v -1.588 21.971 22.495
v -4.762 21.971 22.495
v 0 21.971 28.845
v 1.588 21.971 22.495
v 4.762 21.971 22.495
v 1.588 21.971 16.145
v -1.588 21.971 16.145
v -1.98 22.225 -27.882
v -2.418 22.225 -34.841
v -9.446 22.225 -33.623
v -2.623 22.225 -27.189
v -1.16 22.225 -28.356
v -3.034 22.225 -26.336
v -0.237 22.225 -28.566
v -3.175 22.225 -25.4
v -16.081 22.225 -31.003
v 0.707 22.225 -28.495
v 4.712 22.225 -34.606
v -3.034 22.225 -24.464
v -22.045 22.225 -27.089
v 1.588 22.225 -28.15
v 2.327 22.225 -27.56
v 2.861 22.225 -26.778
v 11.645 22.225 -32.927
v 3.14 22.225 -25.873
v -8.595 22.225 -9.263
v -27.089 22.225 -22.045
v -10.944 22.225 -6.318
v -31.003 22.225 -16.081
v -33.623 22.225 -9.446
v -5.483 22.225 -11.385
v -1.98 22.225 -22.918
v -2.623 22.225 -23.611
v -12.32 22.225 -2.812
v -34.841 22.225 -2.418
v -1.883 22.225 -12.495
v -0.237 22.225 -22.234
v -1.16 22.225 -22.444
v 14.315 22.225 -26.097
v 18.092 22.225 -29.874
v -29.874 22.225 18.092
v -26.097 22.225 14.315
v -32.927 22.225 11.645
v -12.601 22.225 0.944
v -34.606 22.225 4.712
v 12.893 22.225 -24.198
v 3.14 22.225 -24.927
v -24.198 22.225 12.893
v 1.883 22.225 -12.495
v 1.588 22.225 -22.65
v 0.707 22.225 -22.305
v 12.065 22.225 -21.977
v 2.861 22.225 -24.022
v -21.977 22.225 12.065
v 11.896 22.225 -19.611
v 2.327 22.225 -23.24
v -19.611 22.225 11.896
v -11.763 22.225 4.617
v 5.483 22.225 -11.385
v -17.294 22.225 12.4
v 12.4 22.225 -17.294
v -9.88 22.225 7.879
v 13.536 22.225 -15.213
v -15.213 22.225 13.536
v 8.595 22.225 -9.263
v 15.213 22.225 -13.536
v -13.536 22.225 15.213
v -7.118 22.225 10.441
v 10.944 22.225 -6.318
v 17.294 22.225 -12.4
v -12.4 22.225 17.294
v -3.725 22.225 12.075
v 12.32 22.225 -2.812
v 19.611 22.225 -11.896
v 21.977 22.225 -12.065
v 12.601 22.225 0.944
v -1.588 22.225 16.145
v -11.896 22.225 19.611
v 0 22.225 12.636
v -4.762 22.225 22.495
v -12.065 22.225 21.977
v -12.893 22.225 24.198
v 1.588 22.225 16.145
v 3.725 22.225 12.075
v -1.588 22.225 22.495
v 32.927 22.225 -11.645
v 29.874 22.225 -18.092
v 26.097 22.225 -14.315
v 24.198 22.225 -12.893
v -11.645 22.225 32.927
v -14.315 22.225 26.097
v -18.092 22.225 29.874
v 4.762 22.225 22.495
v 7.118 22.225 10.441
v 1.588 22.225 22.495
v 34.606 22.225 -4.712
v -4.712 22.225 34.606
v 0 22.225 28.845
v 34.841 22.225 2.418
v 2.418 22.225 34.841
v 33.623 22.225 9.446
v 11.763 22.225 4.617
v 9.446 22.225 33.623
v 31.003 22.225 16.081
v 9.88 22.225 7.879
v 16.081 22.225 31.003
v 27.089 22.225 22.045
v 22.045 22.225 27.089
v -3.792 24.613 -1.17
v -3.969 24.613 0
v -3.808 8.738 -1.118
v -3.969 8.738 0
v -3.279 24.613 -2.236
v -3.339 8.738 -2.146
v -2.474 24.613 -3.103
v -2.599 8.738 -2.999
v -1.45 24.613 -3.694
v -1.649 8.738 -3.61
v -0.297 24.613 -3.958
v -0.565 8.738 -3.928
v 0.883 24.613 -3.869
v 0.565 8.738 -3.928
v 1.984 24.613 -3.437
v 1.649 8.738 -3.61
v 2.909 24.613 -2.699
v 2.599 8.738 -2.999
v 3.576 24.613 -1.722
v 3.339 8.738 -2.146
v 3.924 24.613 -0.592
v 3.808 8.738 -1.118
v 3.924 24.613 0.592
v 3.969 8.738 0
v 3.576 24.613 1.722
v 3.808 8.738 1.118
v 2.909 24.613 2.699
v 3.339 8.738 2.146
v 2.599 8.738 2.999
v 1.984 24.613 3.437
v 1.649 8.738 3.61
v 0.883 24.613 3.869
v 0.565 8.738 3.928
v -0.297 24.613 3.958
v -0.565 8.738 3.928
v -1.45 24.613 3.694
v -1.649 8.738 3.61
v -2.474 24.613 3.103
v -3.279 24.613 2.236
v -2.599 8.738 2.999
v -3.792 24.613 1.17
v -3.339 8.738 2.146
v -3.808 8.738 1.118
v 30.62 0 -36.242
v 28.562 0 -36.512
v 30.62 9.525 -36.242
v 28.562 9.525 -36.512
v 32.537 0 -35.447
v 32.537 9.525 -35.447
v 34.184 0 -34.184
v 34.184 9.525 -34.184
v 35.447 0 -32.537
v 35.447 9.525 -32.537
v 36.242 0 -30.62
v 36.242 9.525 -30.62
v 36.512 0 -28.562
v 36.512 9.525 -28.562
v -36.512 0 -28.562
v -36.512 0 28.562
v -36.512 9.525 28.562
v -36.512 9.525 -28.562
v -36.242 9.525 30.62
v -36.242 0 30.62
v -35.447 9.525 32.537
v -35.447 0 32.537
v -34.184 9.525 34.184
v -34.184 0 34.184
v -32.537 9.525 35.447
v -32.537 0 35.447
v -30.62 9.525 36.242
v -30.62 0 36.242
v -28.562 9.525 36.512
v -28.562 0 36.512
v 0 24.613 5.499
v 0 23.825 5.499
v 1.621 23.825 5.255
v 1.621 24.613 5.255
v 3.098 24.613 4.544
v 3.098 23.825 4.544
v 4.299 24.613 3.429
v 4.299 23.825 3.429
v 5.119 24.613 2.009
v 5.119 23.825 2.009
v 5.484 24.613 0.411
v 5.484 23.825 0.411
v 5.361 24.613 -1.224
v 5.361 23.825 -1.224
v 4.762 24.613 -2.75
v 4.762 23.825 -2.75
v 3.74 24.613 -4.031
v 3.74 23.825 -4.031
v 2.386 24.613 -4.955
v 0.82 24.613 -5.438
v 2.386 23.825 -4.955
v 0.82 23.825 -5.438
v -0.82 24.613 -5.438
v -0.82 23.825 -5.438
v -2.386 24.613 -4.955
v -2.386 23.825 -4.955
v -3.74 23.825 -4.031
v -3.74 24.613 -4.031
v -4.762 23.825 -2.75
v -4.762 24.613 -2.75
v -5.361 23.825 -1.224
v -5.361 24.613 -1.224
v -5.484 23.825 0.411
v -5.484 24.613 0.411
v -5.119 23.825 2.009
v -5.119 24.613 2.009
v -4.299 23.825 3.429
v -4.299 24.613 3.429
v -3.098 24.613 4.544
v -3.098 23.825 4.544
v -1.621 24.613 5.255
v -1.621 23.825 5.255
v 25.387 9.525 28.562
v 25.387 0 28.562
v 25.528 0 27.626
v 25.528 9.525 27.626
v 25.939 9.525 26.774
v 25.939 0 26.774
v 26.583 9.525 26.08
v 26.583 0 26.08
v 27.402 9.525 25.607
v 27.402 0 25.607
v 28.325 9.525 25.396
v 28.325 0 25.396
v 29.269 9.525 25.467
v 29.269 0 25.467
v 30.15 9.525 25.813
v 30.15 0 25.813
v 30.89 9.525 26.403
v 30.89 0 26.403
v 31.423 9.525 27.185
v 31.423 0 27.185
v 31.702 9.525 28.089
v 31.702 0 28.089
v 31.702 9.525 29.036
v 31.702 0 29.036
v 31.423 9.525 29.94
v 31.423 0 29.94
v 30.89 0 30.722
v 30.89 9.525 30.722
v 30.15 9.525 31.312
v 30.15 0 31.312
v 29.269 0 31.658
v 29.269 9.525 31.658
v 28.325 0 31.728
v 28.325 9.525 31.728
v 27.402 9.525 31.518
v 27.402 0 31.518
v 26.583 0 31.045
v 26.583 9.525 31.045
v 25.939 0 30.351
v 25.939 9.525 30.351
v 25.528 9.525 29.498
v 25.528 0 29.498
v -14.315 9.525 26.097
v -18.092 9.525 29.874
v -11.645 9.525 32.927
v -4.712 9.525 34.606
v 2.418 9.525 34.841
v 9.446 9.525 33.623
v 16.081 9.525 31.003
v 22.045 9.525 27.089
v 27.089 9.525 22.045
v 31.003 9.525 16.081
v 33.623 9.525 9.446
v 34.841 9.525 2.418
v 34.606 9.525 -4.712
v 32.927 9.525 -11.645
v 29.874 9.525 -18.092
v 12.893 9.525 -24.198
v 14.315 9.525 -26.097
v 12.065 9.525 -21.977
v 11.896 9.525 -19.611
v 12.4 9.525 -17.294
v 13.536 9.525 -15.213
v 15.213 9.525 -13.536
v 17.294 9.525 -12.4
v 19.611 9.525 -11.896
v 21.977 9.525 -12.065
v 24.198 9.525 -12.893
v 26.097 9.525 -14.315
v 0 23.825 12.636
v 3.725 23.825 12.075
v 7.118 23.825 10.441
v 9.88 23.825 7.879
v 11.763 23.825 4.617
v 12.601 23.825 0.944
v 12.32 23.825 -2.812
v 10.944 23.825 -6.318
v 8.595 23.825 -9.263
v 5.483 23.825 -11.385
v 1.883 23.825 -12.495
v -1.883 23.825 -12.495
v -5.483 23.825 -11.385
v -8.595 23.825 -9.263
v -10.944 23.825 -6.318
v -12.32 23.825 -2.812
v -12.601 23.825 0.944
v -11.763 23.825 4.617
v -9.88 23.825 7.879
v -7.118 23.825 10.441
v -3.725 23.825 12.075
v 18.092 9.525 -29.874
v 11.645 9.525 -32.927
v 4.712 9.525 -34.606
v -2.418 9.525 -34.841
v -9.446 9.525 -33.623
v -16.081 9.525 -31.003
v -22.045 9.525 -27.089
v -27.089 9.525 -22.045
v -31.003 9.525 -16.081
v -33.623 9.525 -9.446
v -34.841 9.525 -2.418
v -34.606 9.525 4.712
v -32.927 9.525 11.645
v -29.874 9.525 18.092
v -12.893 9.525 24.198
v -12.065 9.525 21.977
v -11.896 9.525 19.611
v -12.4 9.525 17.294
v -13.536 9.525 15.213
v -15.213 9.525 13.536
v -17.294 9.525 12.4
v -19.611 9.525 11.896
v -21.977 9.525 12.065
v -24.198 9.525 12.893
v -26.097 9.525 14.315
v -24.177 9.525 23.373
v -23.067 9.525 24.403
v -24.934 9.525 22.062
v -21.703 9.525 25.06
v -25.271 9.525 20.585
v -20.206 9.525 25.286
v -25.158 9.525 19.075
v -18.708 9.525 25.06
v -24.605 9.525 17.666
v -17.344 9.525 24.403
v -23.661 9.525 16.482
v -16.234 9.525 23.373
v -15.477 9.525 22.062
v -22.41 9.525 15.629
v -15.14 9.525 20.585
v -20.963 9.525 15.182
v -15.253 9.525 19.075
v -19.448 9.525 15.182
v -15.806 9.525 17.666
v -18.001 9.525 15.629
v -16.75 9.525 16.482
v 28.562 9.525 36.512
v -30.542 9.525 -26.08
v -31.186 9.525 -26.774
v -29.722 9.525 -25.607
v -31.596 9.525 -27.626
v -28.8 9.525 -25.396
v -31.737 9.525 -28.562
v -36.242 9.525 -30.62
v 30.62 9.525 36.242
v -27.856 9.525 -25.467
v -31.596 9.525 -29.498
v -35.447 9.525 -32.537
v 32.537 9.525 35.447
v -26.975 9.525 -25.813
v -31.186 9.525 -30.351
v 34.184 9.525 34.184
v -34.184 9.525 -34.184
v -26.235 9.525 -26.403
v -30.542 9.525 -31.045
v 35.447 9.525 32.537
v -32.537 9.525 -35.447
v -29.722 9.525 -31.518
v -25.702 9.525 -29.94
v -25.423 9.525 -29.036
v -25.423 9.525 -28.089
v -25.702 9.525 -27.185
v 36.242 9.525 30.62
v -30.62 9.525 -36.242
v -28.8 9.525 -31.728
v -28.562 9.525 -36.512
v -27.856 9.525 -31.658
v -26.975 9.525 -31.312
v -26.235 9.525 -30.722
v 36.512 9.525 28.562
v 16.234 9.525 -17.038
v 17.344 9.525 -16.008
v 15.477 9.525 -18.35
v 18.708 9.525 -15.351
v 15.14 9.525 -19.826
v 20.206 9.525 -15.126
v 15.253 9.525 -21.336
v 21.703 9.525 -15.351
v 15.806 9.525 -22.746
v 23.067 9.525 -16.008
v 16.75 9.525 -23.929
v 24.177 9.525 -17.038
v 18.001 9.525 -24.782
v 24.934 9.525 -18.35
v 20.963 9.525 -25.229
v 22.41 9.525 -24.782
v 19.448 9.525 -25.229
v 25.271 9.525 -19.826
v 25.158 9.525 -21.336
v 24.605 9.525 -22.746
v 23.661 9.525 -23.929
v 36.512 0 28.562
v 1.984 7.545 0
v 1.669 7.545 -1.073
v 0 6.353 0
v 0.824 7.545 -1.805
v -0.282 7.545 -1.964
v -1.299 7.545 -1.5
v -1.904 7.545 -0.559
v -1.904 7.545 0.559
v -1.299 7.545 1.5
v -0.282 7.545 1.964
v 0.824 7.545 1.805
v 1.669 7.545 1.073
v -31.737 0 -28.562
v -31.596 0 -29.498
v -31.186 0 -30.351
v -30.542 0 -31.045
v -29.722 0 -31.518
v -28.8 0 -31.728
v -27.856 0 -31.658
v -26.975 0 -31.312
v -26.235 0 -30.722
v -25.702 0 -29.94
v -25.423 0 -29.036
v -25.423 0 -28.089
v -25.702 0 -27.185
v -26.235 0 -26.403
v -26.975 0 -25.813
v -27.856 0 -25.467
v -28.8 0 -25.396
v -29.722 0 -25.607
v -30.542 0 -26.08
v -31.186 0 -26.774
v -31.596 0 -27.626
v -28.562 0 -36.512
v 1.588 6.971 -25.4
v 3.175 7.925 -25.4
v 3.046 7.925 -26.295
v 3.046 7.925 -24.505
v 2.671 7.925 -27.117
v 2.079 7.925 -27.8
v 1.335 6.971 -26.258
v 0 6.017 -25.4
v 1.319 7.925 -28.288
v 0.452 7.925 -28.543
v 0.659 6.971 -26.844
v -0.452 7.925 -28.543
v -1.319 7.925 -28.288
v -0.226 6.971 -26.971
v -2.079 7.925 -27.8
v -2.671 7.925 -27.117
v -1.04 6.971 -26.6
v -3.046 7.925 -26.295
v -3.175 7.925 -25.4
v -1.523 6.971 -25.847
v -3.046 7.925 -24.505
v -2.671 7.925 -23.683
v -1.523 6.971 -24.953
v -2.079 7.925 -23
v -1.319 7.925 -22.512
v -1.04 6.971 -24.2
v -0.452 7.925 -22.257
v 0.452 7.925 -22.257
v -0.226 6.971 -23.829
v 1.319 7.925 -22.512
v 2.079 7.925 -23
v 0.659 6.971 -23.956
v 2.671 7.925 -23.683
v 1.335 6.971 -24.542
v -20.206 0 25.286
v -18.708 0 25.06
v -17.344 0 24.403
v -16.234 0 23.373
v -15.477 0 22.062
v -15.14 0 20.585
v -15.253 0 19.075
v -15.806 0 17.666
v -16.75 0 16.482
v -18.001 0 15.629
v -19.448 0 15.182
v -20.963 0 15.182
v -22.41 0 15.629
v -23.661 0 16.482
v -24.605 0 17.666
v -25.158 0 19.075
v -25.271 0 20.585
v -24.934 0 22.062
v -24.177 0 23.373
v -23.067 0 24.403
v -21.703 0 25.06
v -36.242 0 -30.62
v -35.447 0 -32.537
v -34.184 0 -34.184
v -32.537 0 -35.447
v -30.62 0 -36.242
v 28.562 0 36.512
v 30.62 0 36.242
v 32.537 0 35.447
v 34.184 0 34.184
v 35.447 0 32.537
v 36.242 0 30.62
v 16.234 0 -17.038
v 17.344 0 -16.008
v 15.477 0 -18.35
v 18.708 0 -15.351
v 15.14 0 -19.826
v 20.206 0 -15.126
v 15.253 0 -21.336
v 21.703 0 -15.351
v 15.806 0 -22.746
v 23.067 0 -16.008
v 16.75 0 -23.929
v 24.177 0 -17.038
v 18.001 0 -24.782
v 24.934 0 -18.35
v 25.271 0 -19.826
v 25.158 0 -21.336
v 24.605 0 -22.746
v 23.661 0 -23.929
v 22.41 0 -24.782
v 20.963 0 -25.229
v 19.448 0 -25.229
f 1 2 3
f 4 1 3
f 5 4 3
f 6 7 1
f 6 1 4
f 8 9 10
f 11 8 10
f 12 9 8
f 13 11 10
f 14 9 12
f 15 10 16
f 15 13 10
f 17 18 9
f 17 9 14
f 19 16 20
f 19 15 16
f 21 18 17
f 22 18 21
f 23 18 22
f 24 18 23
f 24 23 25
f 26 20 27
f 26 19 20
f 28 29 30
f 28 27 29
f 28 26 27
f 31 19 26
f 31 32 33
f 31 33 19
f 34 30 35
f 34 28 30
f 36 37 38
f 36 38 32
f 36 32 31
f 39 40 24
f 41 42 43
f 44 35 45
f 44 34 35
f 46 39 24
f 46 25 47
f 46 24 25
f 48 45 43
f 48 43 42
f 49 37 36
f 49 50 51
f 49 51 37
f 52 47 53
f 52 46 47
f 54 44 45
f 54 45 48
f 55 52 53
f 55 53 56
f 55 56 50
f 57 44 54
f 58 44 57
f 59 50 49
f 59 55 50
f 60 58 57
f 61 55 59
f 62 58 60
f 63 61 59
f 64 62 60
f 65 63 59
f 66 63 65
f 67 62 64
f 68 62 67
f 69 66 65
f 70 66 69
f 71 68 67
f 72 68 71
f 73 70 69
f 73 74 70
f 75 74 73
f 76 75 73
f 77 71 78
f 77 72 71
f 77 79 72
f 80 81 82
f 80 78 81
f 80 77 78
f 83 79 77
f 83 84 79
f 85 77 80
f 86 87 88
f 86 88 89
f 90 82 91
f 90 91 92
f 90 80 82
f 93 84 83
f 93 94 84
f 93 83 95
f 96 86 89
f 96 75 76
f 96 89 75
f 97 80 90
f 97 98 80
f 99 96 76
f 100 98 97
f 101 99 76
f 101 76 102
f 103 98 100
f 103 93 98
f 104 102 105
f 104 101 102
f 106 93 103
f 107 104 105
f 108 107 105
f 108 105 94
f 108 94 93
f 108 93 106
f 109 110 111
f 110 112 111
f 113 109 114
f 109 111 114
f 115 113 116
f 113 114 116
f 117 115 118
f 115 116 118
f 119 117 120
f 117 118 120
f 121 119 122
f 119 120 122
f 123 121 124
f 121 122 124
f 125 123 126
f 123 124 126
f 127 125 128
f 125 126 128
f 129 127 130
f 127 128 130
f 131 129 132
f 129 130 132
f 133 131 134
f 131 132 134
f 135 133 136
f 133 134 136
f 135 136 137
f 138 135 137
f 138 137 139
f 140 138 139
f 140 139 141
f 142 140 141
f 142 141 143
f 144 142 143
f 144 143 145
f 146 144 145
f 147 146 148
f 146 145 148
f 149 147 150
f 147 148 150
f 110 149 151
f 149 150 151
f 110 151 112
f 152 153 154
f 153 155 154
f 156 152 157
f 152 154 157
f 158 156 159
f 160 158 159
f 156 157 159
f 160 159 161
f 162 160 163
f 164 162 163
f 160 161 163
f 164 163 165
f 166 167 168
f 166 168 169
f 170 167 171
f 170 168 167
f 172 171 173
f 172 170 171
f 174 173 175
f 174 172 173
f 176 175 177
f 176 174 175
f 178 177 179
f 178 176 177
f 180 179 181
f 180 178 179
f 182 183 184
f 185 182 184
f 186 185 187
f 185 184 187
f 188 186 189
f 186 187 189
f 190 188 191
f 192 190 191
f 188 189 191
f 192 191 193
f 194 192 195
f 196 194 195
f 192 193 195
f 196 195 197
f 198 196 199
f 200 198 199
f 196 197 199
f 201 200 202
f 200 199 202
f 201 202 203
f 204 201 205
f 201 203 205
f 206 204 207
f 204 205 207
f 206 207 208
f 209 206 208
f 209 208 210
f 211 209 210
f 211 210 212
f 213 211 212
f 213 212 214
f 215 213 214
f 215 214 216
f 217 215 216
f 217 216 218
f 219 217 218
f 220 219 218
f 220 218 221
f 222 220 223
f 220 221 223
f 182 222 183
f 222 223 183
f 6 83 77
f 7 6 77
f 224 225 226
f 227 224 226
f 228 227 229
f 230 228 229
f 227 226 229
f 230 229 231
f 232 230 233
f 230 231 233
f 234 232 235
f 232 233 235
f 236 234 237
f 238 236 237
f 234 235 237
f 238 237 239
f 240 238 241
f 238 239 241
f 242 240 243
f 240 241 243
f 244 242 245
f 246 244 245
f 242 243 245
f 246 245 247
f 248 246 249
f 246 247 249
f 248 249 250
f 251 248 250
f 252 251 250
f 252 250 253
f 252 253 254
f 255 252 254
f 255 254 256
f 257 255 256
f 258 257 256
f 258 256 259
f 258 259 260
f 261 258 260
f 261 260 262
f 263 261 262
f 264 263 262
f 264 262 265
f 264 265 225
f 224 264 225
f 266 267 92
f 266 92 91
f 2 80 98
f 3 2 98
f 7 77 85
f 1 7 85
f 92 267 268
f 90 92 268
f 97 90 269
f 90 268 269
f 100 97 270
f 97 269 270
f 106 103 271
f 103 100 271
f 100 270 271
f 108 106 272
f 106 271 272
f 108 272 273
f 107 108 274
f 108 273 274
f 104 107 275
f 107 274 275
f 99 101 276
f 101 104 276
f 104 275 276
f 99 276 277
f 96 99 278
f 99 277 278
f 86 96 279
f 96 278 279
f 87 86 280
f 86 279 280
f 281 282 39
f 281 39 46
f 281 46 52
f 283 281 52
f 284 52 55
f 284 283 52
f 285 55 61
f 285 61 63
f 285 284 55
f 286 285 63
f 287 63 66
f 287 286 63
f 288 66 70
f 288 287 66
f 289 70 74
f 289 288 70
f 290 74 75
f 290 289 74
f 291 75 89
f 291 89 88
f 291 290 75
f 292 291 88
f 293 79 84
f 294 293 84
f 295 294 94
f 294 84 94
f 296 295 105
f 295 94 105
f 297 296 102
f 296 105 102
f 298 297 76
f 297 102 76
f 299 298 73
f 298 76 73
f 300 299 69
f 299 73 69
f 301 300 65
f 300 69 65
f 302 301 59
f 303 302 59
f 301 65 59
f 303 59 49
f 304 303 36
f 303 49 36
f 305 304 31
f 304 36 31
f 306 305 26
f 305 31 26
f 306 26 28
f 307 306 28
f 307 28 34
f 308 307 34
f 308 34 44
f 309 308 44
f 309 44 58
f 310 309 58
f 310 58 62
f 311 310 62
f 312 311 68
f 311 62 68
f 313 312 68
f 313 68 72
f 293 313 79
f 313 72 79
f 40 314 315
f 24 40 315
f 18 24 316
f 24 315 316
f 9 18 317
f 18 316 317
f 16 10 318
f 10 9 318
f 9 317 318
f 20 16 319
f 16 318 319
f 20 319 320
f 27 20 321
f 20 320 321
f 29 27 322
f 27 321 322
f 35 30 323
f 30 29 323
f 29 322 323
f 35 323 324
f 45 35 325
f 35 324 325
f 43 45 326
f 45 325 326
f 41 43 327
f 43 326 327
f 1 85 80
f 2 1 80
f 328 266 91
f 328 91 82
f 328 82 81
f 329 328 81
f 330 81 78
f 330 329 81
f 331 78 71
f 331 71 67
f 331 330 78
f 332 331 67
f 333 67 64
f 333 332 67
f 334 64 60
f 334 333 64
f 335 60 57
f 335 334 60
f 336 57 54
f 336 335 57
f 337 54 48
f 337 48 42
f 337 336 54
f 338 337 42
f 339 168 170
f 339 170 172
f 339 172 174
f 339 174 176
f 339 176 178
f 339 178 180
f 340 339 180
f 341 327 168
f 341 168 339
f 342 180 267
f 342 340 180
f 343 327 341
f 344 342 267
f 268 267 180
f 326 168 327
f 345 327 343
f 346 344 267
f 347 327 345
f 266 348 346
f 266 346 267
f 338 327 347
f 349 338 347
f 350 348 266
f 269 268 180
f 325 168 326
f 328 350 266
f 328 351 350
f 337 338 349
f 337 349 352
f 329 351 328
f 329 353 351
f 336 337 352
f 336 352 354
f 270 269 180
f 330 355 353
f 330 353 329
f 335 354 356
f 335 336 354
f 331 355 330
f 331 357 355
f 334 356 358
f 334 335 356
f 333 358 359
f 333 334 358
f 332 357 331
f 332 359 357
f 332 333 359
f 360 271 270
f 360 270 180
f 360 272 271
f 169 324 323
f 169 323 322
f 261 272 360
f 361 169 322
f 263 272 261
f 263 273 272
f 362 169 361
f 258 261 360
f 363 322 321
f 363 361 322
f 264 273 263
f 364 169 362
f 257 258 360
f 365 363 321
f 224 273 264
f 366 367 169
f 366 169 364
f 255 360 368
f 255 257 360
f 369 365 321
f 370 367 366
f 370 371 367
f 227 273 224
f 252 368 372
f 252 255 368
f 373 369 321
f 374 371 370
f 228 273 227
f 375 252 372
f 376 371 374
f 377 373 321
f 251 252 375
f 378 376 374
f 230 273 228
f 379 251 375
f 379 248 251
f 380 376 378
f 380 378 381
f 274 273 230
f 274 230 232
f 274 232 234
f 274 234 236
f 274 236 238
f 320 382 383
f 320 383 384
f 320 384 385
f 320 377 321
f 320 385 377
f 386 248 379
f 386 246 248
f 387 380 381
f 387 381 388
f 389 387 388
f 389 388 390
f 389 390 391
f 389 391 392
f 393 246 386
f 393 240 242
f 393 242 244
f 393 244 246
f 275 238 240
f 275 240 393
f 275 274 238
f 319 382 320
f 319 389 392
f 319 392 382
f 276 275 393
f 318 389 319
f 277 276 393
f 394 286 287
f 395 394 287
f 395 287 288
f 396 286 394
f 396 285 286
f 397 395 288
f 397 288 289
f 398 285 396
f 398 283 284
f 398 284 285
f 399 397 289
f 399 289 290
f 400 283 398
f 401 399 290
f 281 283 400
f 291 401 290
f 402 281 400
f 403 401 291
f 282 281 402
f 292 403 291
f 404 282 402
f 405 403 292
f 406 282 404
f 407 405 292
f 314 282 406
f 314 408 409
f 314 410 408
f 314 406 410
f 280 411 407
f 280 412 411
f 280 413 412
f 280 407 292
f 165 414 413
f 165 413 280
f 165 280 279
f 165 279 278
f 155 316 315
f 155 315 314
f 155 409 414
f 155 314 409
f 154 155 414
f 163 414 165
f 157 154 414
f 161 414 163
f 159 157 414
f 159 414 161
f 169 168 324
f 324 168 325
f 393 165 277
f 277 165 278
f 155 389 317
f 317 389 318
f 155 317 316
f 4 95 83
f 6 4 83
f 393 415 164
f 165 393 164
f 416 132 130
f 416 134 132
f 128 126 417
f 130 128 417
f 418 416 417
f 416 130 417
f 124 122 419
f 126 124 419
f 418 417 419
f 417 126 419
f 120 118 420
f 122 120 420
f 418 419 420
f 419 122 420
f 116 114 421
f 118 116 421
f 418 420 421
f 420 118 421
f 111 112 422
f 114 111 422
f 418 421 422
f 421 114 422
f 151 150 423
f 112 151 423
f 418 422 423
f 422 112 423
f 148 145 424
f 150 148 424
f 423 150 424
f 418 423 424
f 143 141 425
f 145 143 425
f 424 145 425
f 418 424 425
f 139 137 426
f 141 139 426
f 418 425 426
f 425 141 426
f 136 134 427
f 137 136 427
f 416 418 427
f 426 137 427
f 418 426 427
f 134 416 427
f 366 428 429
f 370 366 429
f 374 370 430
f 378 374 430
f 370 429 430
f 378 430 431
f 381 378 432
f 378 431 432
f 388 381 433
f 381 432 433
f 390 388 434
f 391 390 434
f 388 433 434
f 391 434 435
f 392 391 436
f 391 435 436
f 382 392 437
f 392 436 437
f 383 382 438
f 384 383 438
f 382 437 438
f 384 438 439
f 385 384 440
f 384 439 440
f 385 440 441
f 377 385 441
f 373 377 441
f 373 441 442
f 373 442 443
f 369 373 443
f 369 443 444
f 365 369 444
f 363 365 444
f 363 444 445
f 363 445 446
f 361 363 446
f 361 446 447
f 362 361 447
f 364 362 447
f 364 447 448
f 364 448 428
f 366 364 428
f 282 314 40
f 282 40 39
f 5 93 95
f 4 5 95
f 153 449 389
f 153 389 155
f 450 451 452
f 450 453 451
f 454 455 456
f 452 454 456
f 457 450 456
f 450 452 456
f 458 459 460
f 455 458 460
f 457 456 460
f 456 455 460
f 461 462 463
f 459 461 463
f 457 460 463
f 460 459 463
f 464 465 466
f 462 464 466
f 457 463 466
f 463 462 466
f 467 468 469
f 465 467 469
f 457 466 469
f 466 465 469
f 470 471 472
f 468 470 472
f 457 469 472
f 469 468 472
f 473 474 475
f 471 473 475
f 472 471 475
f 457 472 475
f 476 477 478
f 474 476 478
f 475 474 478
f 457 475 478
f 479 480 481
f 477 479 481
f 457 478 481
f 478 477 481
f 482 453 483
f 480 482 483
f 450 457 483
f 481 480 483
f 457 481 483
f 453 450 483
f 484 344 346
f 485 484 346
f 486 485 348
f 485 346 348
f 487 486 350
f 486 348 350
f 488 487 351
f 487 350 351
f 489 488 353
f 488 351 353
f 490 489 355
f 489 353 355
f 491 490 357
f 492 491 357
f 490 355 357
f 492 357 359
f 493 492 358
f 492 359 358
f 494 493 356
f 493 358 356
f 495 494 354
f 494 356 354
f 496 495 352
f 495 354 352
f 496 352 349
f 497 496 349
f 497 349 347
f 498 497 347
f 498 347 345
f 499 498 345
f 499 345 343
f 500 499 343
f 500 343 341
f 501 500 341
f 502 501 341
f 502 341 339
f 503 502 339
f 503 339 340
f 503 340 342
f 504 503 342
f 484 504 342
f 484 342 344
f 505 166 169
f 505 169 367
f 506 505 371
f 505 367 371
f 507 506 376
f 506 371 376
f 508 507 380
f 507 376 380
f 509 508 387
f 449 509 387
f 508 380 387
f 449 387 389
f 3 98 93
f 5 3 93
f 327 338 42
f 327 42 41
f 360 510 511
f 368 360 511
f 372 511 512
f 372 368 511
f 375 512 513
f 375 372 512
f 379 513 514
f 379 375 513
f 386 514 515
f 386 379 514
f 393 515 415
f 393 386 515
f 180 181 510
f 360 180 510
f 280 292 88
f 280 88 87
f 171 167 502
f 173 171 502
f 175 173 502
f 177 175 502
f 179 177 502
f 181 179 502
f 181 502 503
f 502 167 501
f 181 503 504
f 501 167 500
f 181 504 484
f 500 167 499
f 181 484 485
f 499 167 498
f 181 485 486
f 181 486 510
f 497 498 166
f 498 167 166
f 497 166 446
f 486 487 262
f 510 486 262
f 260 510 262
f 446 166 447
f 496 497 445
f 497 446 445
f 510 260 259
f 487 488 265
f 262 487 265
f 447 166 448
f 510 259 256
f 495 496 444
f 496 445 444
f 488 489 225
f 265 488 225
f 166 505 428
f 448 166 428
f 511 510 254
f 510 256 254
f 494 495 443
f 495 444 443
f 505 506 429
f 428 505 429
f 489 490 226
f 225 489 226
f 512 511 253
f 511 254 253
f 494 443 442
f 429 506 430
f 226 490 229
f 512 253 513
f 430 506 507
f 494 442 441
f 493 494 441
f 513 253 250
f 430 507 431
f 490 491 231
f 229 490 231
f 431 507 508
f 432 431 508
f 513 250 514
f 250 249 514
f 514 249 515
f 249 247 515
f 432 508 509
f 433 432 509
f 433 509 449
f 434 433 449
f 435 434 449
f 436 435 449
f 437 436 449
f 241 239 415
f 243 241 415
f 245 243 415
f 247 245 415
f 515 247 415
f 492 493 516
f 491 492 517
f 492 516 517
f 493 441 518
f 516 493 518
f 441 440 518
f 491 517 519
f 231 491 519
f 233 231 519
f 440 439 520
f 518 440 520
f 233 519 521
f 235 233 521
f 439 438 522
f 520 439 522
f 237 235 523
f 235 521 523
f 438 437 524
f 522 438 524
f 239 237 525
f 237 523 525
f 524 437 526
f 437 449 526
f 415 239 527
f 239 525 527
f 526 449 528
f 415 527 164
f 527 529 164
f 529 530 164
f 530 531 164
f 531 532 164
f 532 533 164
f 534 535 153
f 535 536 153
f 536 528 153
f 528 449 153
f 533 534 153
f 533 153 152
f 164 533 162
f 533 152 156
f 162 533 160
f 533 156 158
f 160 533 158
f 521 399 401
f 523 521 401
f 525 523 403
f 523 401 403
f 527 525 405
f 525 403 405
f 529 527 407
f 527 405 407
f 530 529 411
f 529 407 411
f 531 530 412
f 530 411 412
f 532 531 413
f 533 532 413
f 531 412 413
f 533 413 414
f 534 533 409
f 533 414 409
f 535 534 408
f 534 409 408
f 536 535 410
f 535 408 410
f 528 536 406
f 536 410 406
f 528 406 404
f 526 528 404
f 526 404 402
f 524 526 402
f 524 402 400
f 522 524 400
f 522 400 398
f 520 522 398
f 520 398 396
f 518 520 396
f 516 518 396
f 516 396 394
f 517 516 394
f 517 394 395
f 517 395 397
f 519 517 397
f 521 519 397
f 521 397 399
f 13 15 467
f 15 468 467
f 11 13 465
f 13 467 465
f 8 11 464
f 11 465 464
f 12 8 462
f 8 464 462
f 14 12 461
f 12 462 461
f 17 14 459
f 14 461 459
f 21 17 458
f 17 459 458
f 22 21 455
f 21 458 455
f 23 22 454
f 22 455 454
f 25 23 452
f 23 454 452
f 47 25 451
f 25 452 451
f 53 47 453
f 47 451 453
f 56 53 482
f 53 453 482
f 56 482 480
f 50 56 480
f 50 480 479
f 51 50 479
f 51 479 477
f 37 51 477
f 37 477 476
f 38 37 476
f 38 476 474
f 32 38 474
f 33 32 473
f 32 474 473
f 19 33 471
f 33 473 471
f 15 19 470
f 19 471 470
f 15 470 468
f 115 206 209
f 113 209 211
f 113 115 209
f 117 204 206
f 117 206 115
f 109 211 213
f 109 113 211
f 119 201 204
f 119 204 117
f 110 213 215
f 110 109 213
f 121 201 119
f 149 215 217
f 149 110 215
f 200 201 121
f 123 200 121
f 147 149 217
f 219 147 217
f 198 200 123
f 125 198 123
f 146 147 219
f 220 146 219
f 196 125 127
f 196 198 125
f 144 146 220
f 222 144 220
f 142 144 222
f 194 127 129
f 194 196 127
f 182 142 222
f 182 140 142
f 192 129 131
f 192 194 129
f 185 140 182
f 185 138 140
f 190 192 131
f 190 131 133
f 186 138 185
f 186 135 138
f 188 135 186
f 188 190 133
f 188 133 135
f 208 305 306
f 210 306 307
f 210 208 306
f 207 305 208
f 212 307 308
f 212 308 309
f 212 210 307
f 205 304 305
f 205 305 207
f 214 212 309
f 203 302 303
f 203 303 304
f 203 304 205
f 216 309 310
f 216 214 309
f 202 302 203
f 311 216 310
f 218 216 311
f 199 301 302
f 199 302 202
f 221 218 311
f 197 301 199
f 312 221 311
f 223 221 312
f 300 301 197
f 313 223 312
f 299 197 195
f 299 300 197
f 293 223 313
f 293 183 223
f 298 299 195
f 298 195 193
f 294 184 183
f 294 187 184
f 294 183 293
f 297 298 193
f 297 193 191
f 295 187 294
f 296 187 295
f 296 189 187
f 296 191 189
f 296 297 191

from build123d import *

# Parameters (mm, degrees)
SKETCH4_W                       = 73.025
SKETCH4_H                       = 73.025
BOSS_EXTRUDE1_DEPTH             = 9.525
SKETCH7_R                       = 34.925
BOSS_EXTRUDE3_DEPTH             = 12.7
FILLET1_R                       = 7.9502
SKETCH8_R                       = 12.6365
BOSS_EXTRUDE4_DEPTH             = 1.6002
SKETCH9_R                       = 5.4991
BOSS_EXTRUDE5_DEPTH             = 0.7874
CUT_EXTRUDE1_START              = -12.7
CUT_EXTRUDE1_DEPTH              = 12.7
CIRPATTERN1_COUNT               = 2
SKETCH11_R                      = 5.08
CUT_EXTRUDE2_DEPTH              = 54.795548015
F_1_4_0_25_DIAMETER_HOLE1_D     = 6.35
F_1_4_0_25_DIAMETER_HOLE2_D     = 6.35
F_1_4_0_25_DIAMETER_HOLE2_DEPTH = 14.3002
F_1_4_0_25_DIAMETER_HOLE2_TIP   = 1.907732465
F_3_8_16_TAPPED_HOLE1_D         = 7.9375
F_3_8_16_TAPPED_HOLE1_DEPTH     = 15.875
F_3_8_16_TAPPED_HOLE1_TIP       = 2.384665582
CUT_EXTRUDE3_DEPTH              = 0.254


with BuildPart() as part:
    # Sketch4 → Boss-Extrude1 (new body)
    with BuildSketch(Plane(origin=(0, 0, 0), x_dir=(1, 0, 0), z_dir=(0, 1, 0))):
        Rectangle(SKETCH4_W, SKETCH4_H)
    extrude(amount=BOSS_EXTRUDE1_DEPTH)

    # Sketch7 → Boss-Extrude3 (add)
    with BuildSketch(Plane(origin=(0, 9.525, 0), x_dir=(1, 0, 0), z_dir=(0, 1, 0))):
        with Locations(Location((0, 0, 0), (0, 0, 270))):
            Circle(SKETCH7_R)
    extrude(amount=BOSS_EXTRUDE3_DEPTH)

    # Fillet1
    fillet1_edges = [part.edges().sort_by_distance(p)[0] for p in [
        (36.5125, 4.7625, 36.5125),
        (-36.5125, 4.7625, 36.5125),
        (-36.5125, 4.7625, -36.5125),
        (36.5125, 4.7625, -36.5125),
    ]]
    fillet(fillet1_edges, radius=FILLET1_R)

    # Sketch8 → Boss-Extrude4 (add)
    with BuildSketch(Plane(origin=(0, 22.225, 0), x_dir=(1, 0, 0), z_dir=(0, 1, 0))):
        with Locations(Location((0, 0, 0), (0, 0, 270))):
            Circle(SKETCH8_R)
    extrude(amount=BOSS_EXTRUDE4_DEPTH)

    # Sketch9 → Boss-Extrude5 (add)
    with BuildSketch(Plane(origin=(0, 23.8252, 0), x_dir=(1, 0, 0), z_dir=(0, 1, 0))):
        with Locations(Location((0, 0, 0), (0, 0, 270))):
            Circle(SKETCH9_R)
    extrude(amount=BOSS_EXTRUDE5_DEPTH)

    # Sketch10 → Cut-Extrude1 (cut)
    with BuildSketch(Plane(origin=(0, 22.225, 0), x_dir=(1, 0, 0), z_dir=(0, 1, 0)).offset(CUT_EXTRUDE1_START)):
        with BuildLine():
            Line((26.096624288, 14.314528257), (29.873820286, 18.091724255))
            ThreePointArc((29.873820286, 18.091724255), (24.695704333, 24.695704333), (18.091724255, 29.873820286))
            Line((18.091724255, 29.873820286), (14.314528257, 26.096624288))
            ThreePointArc((14.314528257, 26.096624288), (14.314528257, 14.314528257), (26.096624288, 14.314528257))
        make_face()
    cut_extrude1 = extrude(amount=CUT_EXTRUDE1_DEPTH, mode=Mode.SUBTRACT)

    # CirPattern1: Cut-Extrude1 ×2 about axis
    cirpattern1_axis = Axis((0, 0, 0), (0, 1, 0))
    for i in range(1, CIRPATTERN1_COUNT):
        add(cut_extrude1.rotate(cirpattern1_axis, i * 360 / CIRPATTERN1_COUNT), mode=Mode.SUBTRACT)

    # Sketch11 → Cut-Extrude2 (cut, through all)
    with BuildSketch(Plane(origin=(0, 9.525, 0), x_dir=(1, 0, 0), z_dir=(0, 1, 0))):
        with Locations(Location((20.205576272, 20.205576272, 0), (0, 0, 270))):
            Circle(SKETCH11_R)
        with Locations(Location((-20.205576272, -20.205576272, 0), (0, 0, 270))):
            Circle(SKETCH11_R)
    extrude(amount=-CUT_EXTRUDE2_DEPTH, mode=Mode.SUBTRACT)

    # 1/4 (0.25) Diameter Hole1 (through all)
    with Locations(Plane(origin=(0, 9.525, 0), x_dir=(1, 0, 0), z_dir=(0, 1, 0))):
        with Locations((-28.5623, 28.5623), (28.5623, -28.5623)):
            Hole(F_1_4_0_25_DIAMETER_HOLE1_D / 2)

    # 1/4 (0.25) Diameter Hole2
    with Locations(Plane(origin=(0, 22.225, 0), x_dir=(1, 0, 0), z_dir=(0, 1, 0))):
        with Locations((0, 25.4)):
            Hole(F_1_4_0_25_DIAMETER_HOLE2_D / 2, depth=F_1_4_0_25_DIAMETER_HOLE2_DEPTH)
            with Locations((0, 0, -(F_1_4_0_25_DIAMETER_HOLE2_DEPTH + F_1_4_0_25_DIAMETER_HOLE2_TIP / 2))):  # 118° drill point
                Cone(0, F_1_4_0_25_DIAMETER_HOLE2_D / 2, F_1_4_0_25_DIAMETER_HOLE2_TIP, mode=Mode.SUBTRACT)

    # 3/8-16 Tapped Hole1
    with Locations(Plane(origin=(0, 24.6126, 0), x_dir=(1, 0, 0), z_dir=(0, 1, 0))):
        with Locations((0, 0)):
            Hole(F_3_8_16_TAPPED_HOLE1_D / 2, depth=F_3_8_16_TAPPED_HOLE1_DEPTH)
            with Locations((0, 0, -(F_3_8_16_TAPPED_HOLE1_DEPTH + F_3_8_16_TAPPED_HOLE1_TIP / 2))):  # 118° drill point
                Cone(0, F_3_8_16_TAPPED_HOLE1_D / 2, F_3_8_16_TAPPED_HOLE1_TIP, mode=Mode.SUBTRACT)

    # Sketch18 → Cut-Extrude3 (cut)
    with BuildSketch(Plane(origin=(0, 22.225, 0), x_dir=(1, 0, 0), z_dir=(0, 1, 0))):
        Polygon((0, -28.845315502), (4.7625, -22.495315502), (1.5875, -22.495315502), (1.5875, -16.145315502), (-1.5875, -16.145315502), (-1.5875, -22.495315502), (-4.7625, -22.495315502), align=None)
    extrude(amount=-CUT_EXTRUDE3_DEPTH, mode=Mode.SUBTRACT)


solid = part.part
